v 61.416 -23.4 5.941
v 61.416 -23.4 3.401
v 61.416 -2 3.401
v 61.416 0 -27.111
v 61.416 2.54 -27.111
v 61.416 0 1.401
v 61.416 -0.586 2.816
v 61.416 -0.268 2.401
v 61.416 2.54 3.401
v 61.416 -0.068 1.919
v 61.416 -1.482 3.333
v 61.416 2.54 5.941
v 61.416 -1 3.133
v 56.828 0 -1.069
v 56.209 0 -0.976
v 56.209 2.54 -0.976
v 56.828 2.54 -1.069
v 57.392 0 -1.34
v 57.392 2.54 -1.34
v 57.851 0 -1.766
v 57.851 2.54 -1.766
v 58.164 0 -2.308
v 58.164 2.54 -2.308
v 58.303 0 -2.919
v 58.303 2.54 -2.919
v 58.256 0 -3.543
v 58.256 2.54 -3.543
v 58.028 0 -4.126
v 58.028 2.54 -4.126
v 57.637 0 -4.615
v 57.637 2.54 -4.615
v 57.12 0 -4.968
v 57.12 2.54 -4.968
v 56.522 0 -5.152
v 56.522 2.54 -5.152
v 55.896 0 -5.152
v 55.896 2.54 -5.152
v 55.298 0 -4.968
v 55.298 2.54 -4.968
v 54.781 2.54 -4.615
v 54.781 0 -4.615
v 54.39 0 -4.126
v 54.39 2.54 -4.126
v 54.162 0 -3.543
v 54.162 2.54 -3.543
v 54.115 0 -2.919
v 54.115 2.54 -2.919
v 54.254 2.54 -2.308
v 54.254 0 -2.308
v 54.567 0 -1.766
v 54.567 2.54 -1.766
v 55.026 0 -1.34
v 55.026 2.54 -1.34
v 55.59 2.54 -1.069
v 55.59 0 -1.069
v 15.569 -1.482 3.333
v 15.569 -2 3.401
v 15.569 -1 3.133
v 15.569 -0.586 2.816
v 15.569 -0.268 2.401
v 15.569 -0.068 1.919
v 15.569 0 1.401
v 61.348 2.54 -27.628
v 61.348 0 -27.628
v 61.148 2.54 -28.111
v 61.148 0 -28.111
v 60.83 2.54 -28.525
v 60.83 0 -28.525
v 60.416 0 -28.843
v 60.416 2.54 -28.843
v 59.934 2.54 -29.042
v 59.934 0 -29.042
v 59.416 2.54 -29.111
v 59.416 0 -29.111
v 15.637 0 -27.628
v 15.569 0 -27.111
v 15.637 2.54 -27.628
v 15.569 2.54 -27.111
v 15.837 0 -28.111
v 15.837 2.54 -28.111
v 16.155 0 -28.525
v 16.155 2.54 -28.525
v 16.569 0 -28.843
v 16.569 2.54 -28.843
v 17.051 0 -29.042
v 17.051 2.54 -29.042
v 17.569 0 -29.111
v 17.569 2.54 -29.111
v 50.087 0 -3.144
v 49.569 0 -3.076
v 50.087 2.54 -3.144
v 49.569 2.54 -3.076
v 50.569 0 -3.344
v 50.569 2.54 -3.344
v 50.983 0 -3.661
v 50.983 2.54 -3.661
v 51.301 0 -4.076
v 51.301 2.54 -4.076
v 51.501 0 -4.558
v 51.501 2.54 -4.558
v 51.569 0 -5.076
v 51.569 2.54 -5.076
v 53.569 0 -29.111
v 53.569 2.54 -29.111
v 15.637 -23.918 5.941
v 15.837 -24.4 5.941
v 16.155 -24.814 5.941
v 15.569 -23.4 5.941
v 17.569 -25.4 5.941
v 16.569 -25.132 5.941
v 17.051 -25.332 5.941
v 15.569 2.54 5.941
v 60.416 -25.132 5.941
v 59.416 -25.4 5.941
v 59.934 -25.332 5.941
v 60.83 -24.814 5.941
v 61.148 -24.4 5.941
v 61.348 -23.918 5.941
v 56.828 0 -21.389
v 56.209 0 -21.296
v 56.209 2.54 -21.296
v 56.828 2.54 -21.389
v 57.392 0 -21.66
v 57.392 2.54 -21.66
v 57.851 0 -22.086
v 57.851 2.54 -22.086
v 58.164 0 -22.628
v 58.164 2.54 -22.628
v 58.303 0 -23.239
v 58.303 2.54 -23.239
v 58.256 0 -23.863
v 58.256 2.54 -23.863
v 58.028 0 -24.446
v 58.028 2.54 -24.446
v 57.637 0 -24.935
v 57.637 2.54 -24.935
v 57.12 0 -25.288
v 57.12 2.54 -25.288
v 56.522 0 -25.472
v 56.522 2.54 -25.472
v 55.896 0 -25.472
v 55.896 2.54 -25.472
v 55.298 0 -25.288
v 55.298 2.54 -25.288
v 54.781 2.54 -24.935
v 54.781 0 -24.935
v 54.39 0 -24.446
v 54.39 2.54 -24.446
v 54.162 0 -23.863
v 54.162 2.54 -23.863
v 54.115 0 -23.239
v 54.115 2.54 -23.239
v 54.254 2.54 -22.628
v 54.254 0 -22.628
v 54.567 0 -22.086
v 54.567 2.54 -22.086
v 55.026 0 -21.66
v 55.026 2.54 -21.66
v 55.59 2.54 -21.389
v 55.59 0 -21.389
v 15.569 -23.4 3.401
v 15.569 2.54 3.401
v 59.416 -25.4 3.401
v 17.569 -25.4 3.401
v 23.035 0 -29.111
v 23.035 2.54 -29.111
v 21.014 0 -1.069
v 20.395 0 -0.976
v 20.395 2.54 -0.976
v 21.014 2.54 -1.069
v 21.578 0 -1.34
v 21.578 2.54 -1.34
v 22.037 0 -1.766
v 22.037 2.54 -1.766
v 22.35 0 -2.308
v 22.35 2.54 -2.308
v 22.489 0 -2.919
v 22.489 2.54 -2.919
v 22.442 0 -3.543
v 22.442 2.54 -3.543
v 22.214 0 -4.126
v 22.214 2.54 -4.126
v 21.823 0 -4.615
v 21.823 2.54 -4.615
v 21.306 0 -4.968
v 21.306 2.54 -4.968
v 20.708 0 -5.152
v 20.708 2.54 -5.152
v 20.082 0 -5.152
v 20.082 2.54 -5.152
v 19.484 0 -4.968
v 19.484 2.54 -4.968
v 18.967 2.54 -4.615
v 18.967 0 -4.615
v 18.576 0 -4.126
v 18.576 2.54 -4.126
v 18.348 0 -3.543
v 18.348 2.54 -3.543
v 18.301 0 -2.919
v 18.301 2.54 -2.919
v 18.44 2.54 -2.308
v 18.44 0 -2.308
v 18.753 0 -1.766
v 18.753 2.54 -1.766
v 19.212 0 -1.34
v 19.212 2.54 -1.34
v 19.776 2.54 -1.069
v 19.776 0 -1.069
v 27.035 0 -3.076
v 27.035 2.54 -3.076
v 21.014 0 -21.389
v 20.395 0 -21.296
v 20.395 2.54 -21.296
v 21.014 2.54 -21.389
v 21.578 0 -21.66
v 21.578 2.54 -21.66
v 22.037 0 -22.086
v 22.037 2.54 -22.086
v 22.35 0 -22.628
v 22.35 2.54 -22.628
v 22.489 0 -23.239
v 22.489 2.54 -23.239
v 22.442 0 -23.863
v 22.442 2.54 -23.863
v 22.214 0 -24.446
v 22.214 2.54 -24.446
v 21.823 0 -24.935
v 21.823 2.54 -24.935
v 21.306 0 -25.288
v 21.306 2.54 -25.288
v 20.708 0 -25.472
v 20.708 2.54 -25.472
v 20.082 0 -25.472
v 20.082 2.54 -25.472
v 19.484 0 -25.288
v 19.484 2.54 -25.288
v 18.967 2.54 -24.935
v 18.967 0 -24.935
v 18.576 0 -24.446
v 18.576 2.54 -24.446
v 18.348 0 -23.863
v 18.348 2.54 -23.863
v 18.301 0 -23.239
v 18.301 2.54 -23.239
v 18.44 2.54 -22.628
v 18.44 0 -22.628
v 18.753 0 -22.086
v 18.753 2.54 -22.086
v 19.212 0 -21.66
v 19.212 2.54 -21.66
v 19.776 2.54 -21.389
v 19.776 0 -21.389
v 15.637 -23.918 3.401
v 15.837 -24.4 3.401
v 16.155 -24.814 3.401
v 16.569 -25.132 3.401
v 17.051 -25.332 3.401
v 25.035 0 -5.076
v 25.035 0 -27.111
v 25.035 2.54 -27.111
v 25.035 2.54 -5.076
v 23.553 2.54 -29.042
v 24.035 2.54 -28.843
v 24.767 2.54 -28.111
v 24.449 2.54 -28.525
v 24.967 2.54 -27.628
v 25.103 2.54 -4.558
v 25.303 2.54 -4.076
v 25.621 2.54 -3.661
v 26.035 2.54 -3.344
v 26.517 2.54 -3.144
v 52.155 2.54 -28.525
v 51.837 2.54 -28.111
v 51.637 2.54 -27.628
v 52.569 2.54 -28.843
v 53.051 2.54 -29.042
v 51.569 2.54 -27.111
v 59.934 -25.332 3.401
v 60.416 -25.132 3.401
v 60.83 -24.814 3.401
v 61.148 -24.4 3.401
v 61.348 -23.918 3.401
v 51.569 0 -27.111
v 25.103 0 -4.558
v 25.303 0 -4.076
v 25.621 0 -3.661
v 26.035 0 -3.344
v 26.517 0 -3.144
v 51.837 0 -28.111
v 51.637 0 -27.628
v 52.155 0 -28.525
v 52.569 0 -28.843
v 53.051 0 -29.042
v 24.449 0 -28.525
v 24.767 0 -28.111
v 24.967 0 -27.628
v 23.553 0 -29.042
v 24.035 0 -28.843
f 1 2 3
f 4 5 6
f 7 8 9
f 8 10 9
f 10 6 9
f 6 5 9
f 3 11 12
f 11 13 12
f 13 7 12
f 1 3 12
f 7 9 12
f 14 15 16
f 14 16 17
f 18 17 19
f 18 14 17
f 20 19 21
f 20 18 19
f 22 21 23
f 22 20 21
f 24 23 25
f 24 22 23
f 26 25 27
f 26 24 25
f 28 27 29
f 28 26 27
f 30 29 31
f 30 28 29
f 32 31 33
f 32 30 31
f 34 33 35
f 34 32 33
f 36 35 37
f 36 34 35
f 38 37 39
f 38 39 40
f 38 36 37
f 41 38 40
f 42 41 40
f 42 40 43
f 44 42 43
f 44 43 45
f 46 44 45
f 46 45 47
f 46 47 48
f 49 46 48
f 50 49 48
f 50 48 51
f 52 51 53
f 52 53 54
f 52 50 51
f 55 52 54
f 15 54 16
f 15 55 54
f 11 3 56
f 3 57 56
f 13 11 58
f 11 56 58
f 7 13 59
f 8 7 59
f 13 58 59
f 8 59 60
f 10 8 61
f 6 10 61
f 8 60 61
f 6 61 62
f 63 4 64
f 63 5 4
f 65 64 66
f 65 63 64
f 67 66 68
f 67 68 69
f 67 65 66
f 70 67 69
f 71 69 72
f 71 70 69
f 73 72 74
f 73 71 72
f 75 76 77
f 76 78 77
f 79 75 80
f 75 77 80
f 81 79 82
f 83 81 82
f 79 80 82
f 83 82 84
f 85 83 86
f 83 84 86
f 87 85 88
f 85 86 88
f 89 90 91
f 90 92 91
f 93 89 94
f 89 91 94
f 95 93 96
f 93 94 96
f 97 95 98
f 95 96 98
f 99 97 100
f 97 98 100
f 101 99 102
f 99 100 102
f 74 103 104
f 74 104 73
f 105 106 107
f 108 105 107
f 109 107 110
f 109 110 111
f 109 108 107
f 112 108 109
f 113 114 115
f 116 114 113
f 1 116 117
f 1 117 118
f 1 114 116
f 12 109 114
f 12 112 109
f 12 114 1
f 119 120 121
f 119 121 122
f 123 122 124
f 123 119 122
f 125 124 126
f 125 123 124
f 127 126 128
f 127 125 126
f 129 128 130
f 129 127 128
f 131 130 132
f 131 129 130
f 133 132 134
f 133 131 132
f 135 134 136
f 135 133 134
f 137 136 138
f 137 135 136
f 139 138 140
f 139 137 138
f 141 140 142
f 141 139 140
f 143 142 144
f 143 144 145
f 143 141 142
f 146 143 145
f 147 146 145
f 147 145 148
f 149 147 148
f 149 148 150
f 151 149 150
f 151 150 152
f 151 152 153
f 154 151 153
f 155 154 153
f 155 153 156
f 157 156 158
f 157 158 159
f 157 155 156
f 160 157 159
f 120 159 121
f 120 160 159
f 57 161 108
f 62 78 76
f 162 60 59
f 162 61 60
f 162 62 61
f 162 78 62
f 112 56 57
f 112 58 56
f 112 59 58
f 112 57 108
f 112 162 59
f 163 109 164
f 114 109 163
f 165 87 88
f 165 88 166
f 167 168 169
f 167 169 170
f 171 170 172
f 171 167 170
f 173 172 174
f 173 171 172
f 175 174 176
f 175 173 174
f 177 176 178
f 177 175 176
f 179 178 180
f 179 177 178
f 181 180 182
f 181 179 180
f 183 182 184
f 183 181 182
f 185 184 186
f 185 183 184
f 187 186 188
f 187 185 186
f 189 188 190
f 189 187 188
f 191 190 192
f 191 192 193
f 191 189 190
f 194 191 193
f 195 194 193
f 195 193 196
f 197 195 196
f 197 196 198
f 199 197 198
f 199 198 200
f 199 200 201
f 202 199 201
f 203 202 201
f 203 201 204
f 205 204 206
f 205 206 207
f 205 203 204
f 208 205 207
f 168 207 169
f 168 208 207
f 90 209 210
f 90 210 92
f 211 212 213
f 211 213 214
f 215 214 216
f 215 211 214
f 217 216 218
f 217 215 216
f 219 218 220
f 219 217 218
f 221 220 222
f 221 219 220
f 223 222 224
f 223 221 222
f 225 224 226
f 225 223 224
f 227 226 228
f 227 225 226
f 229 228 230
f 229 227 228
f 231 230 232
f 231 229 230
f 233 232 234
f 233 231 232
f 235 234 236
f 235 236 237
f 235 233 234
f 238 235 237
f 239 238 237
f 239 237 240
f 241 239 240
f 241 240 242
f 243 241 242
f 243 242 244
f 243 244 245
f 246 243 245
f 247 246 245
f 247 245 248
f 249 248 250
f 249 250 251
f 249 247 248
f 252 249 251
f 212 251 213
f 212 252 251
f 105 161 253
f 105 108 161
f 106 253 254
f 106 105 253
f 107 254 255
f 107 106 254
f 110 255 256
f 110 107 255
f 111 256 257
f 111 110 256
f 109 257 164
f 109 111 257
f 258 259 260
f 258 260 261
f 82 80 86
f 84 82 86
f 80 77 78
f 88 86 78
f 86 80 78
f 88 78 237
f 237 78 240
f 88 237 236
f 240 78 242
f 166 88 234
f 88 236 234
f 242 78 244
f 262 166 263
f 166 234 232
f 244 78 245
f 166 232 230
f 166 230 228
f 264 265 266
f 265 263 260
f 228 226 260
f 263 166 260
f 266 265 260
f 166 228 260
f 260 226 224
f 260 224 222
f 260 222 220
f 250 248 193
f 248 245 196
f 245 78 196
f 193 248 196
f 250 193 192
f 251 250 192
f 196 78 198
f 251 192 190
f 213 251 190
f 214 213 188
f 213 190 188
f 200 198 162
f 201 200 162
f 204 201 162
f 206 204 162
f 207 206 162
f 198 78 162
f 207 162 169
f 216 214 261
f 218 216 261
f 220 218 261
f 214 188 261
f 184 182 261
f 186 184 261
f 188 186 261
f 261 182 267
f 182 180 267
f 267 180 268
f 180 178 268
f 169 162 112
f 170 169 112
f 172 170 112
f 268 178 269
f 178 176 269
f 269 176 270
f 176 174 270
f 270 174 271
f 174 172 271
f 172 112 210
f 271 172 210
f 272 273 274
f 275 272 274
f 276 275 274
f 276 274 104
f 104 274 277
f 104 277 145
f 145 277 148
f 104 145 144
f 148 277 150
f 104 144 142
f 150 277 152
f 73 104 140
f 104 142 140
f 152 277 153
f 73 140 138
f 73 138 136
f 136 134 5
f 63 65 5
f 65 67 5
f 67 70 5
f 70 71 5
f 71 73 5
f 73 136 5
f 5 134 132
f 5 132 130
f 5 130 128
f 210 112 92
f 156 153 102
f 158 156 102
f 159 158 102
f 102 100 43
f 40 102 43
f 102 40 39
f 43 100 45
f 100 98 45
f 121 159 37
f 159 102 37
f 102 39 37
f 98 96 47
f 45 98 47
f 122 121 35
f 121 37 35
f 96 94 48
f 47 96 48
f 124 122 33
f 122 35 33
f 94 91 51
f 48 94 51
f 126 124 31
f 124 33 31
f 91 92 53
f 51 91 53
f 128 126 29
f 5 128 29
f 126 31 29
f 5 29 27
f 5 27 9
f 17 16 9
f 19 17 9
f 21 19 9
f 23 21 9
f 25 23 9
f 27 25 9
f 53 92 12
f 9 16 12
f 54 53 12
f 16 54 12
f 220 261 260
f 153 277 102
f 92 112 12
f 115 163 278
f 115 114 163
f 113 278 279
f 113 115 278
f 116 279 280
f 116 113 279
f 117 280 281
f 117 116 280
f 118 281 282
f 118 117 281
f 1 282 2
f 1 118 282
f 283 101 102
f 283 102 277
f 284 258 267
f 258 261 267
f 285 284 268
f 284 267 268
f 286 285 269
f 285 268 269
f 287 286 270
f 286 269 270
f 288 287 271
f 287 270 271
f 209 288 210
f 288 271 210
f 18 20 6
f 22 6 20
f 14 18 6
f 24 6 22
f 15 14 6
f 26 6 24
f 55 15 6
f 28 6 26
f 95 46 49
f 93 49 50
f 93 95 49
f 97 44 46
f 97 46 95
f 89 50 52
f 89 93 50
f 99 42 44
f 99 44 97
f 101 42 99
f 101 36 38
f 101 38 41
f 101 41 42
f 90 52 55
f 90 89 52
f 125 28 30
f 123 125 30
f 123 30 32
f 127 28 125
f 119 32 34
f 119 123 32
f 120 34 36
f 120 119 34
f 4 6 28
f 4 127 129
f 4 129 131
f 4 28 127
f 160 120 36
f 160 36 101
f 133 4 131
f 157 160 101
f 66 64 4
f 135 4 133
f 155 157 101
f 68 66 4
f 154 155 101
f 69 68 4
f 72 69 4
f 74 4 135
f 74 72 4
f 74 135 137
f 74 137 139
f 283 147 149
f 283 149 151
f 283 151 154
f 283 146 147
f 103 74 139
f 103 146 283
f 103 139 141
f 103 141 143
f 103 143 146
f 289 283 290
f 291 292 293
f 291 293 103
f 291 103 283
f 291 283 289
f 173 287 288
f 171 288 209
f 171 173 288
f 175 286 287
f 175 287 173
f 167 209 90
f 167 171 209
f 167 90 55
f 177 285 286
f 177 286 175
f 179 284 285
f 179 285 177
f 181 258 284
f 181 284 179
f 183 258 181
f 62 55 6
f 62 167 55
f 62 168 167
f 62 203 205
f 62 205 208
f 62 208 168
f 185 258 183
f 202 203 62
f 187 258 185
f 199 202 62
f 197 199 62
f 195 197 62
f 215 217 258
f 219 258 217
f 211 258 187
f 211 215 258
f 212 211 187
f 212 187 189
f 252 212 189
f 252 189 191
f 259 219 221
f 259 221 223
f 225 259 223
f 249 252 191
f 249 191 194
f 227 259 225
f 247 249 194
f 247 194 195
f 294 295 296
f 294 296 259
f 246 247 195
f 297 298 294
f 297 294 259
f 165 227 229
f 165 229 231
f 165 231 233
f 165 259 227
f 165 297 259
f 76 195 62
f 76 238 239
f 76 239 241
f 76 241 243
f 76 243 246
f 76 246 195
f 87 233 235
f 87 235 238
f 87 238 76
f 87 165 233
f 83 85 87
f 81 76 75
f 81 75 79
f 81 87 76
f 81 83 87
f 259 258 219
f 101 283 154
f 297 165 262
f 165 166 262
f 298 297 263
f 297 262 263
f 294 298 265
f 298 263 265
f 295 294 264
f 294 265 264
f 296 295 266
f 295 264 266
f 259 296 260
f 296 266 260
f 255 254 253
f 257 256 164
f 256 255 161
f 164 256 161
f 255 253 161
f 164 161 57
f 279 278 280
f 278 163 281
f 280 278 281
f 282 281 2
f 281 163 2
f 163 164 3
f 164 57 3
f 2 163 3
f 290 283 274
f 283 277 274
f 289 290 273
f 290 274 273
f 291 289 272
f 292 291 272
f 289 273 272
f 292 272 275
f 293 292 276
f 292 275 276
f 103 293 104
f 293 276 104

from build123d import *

# Parameters (mm, degrees)
SKETCH1_R                = 2.1
BOSS_EXTRUDE1_DEPTH      = 2.54
BOSS_EXTRUDE2_DEPTH      = 25.4
BOSS_EXTRUDE2_DEPTH_BACK = 2.54
SKETCH2_W                = 45.847007751
SKETCH2_H                = 2.54
FILLET1_R                = 2


with BuildPart() as part:
    # Sketch1 → Boss-Extrude1 (new body)
    with BuildSketch(Plane(origin=(0, 0, 0), x_dir=(1, 0, 0), z_dir=(0, 1, 0))):
        Polygon((15.569104138, 29.110597295), (25.03510725, 29.110597295), (25.03510725, 3.075596379), (51.56910725, 3.075596379), (51.56910725, 29.110597295), (61.416111889, 29.110597295), (61.416111889, -2.131403285), (61.416111889, -3.401403285), (15.569104138, -3.401403285), (15.569104138, -2.131403285), align=None)
        with Locations(Location((20.39510725, 23.395596379, 0), (0, 0, 270))):
            Circle(SKETCH1_R, mode=Mode.SUBTRACT)
        with Locations(Location((20.39510725, 3.075596379, 0), (0, 0, 270))):
            Circle(SKETCH1_R, mode=Mode.SUBTRACT)
        with Locations(Location((56.20910725, 23.395596379, 0), (0, 0, 270))):
            Circle(SKETCH1_R, mode=Mode.SUBTRACT)
        with Locations(Location((56.20910725, 3.075596379, 0), (0, 0, 270))):
            Circle(SKETCH1_R, mode=Mode.SUBTRACT)
    extrude(amount=BOSS_EXTRUDE1_DEPTH)

    # Sketch2 → Boss-Extrude2 (add, two sides: drawn at the far end of the back side and taken through both)
    with BuildSketch(Plane.XZ.offset(-BOSS_EXTRUDE2_DEPTH_BACK)):
        with Locations((38.492608014, 4.671403285)):
            Rectangle(SKETCH2_W, SKETCH2_H)
    extrude(amount=BOSS_EXTRUDE2_DEPTH + BOSS_EXTRUDE2_DEPTH_BACK)

    # Fillet1
    fillet1_edges = [part.edges().sort_by_distance(p)[0] for p in [
        (38.492608013, 0, 3.401403285),
        (15.569104138, 1.27, -29.110597295),
        (25.03510725, 1.27, -29.110597295),
        (25.03510725, 1.27, -3.075596379),
        (51.56910725, 1.27, -3.075596379),
        (51.56910725, 1.27, -29.110597295),
        (61.416111889, 1.27, -29.110597295),
        (15.569104138, -25.4, 4.671403285),
        (61.416111889, -25.4, 4.671403285),
    ]]
    fillet(fillet1_edges, radius=FILLET1_R)


solid = part.part
